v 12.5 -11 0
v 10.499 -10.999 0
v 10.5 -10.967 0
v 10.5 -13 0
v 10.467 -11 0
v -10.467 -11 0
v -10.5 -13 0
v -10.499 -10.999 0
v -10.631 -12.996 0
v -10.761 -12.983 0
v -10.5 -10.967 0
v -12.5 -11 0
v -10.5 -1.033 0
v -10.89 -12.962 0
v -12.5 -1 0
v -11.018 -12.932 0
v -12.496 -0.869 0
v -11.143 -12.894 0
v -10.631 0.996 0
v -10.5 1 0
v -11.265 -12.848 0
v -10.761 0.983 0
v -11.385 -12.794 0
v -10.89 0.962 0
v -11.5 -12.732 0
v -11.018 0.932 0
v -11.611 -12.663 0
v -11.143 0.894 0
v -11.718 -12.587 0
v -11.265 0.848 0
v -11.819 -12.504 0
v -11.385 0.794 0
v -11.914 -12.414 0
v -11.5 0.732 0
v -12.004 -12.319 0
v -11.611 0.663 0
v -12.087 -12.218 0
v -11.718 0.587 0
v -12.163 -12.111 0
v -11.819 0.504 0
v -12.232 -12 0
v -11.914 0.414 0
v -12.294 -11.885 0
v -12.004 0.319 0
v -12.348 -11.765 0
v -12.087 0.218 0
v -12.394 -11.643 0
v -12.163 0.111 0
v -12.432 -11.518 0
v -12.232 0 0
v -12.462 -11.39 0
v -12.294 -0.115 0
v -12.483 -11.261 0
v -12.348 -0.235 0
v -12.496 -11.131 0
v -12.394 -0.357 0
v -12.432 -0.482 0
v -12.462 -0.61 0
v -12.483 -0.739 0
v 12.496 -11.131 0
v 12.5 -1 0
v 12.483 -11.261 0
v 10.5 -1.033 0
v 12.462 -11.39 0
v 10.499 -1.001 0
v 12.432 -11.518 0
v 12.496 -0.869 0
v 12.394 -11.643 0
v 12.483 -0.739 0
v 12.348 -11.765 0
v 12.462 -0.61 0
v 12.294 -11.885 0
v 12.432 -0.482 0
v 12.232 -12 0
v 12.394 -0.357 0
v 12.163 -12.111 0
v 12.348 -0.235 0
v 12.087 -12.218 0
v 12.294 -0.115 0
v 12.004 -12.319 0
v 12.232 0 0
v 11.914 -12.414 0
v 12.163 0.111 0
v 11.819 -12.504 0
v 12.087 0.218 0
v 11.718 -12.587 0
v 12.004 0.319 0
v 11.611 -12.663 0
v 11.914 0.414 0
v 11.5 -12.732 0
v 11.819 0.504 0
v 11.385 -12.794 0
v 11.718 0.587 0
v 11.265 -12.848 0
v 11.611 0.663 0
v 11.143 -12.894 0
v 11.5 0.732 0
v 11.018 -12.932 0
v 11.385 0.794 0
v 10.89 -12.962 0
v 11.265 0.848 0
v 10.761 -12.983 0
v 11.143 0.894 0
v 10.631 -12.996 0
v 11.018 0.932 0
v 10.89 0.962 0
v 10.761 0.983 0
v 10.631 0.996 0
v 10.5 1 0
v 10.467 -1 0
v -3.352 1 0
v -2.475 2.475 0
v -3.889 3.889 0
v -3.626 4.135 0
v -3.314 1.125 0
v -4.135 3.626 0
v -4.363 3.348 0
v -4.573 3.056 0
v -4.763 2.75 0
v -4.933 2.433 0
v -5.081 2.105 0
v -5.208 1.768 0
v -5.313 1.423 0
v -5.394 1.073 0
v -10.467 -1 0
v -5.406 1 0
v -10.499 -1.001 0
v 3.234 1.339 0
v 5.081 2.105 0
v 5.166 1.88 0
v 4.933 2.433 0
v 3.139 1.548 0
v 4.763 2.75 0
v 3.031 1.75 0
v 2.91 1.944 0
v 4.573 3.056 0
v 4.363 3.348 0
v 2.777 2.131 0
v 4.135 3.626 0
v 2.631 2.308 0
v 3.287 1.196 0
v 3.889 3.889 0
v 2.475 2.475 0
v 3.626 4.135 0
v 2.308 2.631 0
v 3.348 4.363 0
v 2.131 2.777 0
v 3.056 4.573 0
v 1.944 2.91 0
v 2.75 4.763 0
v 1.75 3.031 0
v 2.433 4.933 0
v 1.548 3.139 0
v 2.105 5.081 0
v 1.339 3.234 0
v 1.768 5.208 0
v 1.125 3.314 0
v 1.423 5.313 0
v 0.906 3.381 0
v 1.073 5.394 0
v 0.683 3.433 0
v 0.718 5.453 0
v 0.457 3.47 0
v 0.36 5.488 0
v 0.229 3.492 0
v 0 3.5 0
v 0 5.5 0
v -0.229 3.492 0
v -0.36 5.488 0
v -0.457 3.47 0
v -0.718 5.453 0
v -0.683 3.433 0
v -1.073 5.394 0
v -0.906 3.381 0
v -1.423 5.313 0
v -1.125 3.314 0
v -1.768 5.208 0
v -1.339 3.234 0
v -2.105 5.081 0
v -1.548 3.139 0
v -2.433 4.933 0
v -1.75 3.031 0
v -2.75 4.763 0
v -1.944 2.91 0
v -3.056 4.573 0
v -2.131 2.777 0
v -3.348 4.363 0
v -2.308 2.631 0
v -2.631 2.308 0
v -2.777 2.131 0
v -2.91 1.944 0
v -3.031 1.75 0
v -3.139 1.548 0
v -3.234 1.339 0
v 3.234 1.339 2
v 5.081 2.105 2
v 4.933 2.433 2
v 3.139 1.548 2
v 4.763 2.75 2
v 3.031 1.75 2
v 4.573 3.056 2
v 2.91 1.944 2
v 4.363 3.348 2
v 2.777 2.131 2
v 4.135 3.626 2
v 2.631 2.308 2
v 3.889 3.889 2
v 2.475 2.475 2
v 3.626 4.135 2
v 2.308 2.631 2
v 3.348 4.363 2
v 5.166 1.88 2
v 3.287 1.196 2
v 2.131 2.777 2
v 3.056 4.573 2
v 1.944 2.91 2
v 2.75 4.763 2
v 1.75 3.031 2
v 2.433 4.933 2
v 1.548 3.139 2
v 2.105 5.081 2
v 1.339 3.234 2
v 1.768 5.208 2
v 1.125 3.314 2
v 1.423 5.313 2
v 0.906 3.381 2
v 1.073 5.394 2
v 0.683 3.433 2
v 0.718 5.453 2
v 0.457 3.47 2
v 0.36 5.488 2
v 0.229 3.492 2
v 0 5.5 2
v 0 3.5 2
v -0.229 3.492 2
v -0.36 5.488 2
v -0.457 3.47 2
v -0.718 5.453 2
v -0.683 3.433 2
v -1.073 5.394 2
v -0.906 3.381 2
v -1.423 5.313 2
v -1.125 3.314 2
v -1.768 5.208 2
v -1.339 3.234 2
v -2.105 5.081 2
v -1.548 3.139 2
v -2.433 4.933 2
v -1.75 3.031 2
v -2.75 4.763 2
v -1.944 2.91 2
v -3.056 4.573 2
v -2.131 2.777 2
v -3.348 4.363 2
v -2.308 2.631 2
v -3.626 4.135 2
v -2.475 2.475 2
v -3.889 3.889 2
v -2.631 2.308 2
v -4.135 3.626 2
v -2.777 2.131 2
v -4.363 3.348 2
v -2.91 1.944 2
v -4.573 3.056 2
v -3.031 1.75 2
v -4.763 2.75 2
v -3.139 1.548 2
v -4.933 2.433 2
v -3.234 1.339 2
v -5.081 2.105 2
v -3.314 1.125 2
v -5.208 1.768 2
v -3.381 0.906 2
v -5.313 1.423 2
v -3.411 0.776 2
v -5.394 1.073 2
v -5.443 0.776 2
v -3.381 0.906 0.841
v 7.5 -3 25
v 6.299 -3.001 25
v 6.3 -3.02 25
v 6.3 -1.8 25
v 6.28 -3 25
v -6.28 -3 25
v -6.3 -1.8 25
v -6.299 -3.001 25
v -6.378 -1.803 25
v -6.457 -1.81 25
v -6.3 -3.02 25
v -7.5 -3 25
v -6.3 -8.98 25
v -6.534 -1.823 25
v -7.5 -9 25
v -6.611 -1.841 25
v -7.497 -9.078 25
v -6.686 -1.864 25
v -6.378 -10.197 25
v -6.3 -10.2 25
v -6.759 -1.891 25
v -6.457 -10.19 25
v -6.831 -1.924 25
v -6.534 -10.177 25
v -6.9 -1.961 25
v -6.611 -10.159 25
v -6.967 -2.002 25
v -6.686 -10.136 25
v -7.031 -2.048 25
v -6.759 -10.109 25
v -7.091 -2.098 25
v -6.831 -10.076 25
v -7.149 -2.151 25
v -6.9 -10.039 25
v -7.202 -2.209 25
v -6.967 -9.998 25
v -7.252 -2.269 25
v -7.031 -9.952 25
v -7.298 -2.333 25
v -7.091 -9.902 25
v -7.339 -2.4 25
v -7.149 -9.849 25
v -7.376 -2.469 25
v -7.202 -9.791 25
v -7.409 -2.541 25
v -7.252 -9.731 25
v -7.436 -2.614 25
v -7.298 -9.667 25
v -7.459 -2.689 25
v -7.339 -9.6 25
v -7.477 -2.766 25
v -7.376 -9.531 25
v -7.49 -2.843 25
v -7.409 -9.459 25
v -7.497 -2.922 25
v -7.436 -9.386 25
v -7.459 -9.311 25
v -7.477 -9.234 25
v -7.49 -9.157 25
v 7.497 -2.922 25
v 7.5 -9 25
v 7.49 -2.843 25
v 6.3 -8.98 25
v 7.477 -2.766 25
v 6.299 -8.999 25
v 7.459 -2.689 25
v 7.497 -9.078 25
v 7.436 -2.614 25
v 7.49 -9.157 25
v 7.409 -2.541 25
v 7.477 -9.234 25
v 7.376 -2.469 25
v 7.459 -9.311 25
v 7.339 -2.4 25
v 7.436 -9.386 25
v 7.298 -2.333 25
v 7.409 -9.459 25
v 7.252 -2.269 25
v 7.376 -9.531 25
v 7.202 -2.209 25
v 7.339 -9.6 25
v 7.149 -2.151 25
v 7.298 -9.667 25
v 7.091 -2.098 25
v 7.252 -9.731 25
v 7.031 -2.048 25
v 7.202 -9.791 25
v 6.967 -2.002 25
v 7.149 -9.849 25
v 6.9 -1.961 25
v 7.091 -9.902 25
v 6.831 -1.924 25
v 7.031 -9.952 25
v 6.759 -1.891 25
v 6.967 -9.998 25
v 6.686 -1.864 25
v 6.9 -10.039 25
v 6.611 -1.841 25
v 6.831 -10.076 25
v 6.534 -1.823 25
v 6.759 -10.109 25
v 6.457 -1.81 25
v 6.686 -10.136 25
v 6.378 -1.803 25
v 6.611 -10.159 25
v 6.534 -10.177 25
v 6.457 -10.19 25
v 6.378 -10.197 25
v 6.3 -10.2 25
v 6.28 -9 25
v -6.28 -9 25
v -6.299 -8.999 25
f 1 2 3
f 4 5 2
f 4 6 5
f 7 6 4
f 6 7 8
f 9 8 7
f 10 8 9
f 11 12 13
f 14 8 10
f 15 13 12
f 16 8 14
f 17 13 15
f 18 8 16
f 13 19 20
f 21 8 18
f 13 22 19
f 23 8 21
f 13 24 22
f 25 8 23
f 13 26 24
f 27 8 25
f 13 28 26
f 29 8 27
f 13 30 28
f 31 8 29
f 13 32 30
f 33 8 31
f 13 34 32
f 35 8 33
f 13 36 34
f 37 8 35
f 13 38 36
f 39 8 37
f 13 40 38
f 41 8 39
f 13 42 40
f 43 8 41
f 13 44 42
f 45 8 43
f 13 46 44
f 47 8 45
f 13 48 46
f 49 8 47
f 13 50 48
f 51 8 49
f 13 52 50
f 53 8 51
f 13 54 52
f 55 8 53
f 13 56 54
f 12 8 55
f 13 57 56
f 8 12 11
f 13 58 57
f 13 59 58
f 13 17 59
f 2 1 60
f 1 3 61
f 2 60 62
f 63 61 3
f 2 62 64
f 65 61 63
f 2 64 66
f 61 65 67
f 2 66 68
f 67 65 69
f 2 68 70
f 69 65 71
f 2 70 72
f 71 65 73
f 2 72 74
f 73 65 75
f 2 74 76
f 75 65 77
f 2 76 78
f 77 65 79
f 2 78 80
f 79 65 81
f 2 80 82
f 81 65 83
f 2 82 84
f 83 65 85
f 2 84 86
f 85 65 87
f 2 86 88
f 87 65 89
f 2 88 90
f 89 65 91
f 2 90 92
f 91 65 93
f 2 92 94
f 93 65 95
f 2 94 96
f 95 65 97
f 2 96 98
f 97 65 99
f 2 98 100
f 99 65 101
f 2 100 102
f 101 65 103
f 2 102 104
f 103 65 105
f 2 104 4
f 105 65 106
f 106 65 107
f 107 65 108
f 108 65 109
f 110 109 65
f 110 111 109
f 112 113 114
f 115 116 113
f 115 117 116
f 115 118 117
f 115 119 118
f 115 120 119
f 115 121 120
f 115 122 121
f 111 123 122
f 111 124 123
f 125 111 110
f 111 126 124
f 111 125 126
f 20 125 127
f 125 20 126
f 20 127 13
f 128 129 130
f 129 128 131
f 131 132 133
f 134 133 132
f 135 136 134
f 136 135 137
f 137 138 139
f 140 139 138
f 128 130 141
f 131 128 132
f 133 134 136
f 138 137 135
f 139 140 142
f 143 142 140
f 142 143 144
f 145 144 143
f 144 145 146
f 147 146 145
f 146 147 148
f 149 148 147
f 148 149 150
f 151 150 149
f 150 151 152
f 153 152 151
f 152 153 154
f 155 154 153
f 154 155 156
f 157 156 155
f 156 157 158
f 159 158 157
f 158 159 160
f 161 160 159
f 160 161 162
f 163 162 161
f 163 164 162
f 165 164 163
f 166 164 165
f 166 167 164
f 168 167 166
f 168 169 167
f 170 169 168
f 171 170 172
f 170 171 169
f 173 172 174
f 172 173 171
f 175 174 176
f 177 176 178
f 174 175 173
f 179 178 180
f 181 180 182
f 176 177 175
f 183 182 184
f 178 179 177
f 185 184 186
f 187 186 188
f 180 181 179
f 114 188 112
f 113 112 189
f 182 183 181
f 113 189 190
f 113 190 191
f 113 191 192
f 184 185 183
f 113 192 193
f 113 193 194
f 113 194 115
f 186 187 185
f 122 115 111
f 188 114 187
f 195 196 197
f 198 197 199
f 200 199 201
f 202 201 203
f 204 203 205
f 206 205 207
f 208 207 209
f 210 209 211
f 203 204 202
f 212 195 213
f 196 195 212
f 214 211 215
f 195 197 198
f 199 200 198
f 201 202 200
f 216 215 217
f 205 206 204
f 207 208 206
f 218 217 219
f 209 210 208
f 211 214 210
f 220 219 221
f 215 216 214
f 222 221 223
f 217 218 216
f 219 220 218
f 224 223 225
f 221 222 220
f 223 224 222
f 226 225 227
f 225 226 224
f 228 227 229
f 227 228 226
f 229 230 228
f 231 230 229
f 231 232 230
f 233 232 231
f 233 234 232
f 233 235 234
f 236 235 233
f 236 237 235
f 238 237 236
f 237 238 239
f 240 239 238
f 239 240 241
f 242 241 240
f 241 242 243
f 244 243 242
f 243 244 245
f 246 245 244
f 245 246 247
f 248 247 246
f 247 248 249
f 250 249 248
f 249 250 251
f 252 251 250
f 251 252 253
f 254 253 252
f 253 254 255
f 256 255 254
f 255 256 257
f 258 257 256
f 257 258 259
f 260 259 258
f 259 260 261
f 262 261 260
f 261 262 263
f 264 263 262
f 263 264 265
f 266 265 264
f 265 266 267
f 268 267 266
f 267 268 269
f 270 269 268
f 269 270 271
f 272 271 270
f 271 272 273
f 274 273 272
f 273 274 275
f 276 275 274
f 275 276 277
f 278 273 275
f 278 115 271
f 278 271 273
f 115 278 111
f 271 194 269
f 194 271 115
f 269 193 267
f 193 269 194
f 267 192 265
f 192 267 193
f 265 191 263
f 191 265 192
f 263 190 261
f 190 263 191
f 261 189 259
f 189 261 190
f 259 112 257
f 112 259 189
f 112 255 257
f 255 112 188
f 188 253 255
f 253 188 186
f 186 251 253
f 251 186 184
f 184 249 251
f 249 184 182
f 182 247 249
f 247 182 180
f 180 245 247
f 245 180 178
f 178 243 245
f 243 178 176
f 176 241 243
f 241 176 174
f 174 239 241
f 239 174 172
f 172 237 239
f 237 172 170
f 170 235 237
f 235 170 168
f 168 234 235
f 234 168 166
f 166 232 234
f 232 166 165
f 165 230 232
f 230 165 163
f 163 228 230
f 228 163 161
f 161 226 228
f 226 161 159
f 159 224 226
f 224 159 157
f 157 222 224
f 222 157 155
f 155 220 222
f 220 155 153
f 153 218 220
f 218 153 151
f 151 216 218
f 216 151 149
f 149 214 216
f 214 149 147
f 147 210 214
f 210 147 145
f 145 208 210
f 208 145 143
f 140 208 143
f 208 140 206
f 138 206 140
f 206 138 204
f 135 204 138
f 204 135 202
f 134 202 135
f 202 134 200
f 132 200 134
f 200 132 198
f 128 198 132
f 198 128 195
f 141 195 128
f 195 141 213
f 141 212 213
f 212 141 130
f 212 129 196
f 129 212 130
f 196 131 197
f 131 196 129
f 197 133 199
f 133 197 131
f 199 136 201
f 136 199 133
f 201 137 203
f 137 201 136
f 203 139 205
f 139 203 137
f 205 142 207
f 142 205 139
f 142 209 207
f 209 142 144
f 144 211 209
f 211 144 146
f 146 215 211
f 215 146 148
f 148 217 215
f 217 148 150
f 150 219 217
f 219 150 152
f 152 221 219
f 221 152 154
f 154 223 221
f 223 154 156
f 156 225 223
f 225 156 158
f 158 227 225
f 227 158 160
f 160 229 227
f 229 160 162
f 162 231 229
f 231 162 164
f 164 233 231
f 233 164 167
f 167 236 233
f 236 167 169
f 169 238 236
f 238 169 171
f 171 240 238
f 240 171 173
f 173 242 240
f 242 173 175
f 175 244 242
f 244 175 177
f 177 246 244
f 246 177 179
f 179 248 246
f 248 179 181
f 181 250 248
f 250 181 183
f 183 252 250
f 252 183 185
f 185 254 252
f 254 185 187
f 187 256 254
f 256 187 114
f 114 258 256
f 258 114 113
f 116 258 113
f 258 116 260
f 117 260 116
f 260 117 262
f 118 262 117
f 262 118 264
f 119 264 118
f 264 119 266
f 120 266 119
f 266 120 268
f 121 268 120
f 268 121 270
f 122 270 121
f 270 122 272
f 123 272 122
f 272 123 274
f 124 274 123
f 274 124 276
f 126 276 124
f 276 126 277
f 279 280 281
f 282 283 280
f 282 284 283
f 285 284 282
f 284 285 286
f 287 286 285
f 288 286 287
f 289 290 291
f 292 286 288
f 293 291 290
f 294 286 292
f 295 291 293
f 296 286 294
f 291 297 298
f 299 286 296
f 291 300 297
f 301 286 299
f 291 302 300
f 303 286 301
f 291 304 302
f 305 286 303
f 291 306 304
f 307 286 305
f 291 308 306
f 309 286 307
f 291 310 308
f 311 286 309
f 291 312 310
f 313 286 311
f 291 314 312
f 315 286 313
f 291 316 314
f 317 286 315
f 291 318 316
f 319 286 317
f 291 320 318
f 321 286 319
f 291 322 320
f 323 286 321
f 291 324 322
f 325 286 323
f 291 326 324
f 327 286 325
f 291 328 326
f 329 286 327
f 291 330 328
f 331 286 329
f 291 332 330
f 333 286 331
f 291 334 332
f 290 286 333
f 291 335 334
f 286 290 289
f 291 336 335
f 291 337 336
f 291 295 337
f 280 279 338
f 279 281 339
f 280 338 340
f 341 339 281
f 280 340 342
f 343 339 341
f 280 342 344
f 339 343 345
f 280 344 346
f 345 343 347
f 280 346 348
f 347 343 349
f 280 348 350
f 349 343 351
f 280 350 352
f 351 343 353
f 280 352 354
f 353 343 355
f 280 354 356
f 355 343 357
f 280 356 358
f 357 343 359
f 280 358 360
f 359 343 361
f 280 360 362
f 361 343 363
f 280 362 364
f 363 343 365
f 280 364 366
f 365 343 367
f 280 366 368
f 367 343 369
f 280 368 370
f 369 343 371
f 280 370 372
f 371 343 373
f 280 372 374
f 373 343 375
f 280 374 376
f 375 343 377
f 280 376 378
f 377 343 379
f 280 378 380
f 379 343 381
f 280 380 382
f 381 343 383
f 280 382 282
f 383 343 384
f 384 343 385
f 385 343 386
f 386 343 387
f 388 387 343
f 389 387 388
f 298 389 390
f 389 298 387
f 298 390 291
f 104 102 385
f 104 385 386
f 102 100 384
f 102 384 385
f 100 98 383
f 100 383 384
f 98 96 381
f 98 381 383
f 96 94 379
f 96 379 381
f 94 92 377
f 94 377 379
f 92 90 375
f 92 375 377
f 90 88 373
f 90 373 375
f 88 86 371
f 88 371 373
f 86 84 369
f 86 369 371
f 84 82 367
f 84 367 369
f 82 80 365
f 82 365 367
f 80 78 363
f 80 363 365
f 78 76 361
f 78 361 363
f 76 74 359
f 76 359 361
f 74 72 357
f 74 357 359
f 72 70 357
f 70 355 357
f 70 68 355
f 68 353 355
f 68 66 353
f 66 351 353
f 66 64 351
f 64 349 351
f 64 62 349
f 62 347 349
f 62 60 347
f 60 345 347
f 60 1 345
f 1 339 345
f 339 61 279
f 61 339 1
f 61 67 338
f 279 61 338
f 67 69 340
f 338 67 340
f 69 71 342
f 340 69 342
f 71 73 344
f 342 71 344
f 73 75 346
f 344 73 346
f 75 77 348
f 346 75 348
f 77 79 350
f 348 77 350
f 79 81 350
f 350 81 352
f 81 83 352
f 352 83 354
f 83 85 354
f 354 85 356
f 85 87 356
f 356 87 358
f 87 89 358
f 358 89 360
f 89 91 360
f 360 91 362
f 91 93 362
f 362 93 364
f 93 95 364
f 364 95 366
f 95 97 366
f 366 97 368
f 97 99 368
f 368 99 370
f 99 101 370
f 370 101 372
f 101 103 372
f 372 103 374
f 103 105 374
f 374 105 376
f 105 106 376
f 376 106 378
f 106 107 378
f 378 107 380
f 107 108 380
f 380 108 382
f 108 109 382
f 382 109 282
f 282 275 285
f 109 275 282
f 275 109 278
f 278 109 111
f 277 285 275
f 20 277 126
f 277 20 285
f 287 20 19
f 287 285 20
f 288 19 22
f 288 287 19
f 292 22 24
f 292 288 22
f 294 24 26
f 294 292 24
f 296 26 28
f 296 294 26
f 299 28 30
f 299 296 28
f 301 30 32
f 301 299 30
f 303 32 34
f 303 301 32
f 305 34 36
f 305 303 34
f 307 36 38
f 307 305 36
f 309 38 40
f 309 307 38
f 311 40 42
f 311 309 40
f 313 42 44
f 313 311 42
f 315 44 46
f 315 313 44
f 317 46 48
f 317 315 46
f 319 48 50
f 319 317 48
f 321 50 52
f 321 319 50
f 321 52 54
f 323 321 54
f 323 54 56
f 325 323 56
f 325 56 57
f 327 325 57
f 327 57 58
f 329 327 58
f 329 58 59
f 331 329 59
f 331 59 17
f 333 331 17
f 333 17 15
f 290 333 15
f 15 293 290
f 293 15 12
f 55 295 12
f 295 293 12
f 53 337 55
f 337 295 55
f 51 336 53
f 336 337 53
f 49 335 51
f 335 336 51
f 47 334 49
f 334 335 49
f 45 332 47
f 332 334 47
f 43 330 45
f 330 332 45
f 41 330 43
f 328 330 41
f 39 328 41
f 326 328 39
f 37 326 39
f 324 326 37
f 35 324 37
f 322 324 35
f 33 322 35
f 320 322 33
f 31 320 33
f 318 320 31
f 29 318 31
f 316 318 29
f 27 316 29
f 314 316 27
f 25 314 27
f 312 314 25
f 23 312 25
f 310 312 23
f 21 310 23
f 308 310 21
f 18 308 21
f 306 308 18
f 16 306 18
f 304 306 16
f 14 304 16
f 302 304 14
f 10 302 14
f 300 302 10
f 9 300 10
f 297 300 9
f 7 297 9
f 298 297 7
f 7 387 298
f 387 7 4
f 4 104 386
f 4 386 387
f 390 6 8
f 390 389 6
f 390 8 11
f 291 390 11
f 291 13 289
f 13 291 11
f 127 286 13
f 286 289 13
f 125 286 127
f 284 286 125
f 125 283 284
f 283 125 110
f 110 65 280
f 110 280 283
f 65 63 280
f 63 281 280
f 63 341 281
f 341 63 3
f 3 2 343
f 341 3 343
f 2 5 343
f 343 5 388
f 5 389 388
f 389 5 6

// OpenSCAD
ring_radius = 3.5;
ring_start_angle = 20;
ring_end_angle = 180;
thickness = 2;

funnel_length = 25;
funnel_width = 14;
funnel_height = 25;
linear_extrude_scale = 0.6;

union() {
    linear_extrude(thickness) 
        arc(radius = ring_radius, 
            angle = [ring_start_angle, ring_end_angle], 
            width = thickness, 
            width_mode = "LINE_OUTWARD",
            $fn = 96);

    translate([0, -funnel_width / 2+ thickness / 2, 0]) 
        linear_extrude(funnel_height, scale = linear_extrude_scale) 
            hollow_out(shell_thickness = thickness)
                rounded_square(
                    size = [funnel_length, funnel_width],
                    corner_r = 2, 
                    center = true,
                    $fn = 96
                );
}
    
/**
 * The dotSCAD library
 * @copyright Justin Lin, 2017
 * @license https://opensource.org/licenses/lgpl-3.0.html
 *
 * @see https://github.com/JustinSDK/dotSCAD
*/

/**
* arc.scad
*
* Creates an arc. You can pass a 2 element vector to define the central angle. 
* Its $fa, $fs and $fn parameters are consistent with the circle module.
* It depends on the circular_sector module so you have to include circular_sector.scad.
* 
* @copyright Justin Lin, 2017
* @license https://opensource.org/licenses/lgpl-3.0.html
*
* @see https://openhome.cc/eGossip/OpenSCAD/lib-arc.html
*
**/ 


module arc(radius, angle, width, width_mode = "LINE_CROSS") {
    polygon(__shape_arc(radius, angle, width, width_mode));
}

function __frags(radius) = $fn > 0 ? 
            ($fn >= 3 ? $fn : 3) : 
            max(min(360 / $fa, radius * 6.28318 / $fs), 5);

function __trapezium(length, h, round_r) =
    let(
        r_half_trapezium = __half_trapezium(length / 2, h, round_r),
        to = len(r_half_trapezium) - 1,
        l_half_trapezium = [
            for(i = [0:to]) 
                let(pt = r_half_trapezium[to - i])
                [-pt[0], pt[1]]
        ]
    )    
    concat(
        r_half_trapezium,
        l_half_trapezium
    );

/**
* rounded_square.scad
*
* Creates a rounded square or rectangle in the first quadrant. 
* When center is true the square is centered on the origin.
* 
* @copyright Justin Lin, 2017
* @license https://opensource.org/licenses/lgpl-3.0.html
*
* @see https://openhome.cc/eGossip/OpenSCAD/lib-rounded_square.html
*
**/


module rounded_square(size, corner_r, center = false) {
    is_vt = __is_vector(size);
    x = is_vt ? size[0] : size;
    y = is_vt ? size[1] : size;       
    
    position = center ? [0, 0] : [x / 2, y / 2];
    points = __trapezium(
        length = x, 
        h = y, 
        round_r = corner_r
    );

    translate(position) 
        polygon(points);

    // hook for testing
    test_rounded_square(position, points);
}

// override it to test
module test_rounded_square(position, points) {
}

function __edge_r_begin(orig_r, a, a_step, m) =
    let(leng = orig_r * cos(a_step / 2))
    leng / cos((m - 0.5) * a_step - a);

function __edge_r_end(orig_r, a, a_step, n) =      
    let(leng = orig_r * cos(a_step / 2))    
    leng / cos((n + 0.5) * a_step - a);

function __shape_arc(radius, angle, width, width_mode = "LINE_CROSS") =
    let(
        w_offset = width_mode == "LINE_CROSS" ? [width / 2, -width / 2] : (
            width_mode == "LINE_INWARD" ? [0, -width] : [width, 0]
        ),
        frags = __frags(radius),
        a_step = 360 / frags,
        half_a_step = a_step / 2,
        angles = __is_vector(angle) ? angle : [0, angle],
        m = floor(angles[0] / a_step) + 1,
        n = floor(angles[1] / a_step),
        r_outer = radius + w_offset[0],
        r_inner = radius + w_offset[1],
        points = concat(
            // outer arc path
            [__ra_to_xy(__edge_r_begin(r_outer, angles[0], a_step, m), angles[0])],
            m > n ? [] : [
                for(i = [m:n]) 
                    __ra_to_xy(r_outer, a_step * i)
            ],
            angles[1] == a_step * n ? [] : [__ra_to_xy(__edge_r_end(r_outer, angles[1], a_step, n), angles[1])],
            // inner arc path
            angles[1] == a_step * n ? [] : [__ra_to_xy(__edge_r_end(r_inner, angles[1], a_step, n), angles[1])],
            m > n ? [] : [
                for(i = [m:n]) 
                    let(idx = (n + (m - i)))
                    __ra_to_xy(r_inner, a_step * idx)

            ],
            [__ra_to_xy(__edge_r_begin(r_inner, angles[0], a_step, m), angles[0])]        
        )
    ) points;

function __pie_for_rounding(r, begin_a, end_a, frags) =
    let(
        sector_angle = end_a - begin_a,
        step_a = sector_angle / frags,
        is_integer = frags % 1 == 0
    )
    r < 0.00005 ? [[0, 0]] : concat([
        for(ang = [begin_a:step_a:end_a])
            [
                r * cos(ang), 
                r * sin(ang)
            ]
    ], 
    is_integer ? [] : [[
            r * cos(end_a), 
            r * sin(end_a)
        ]]
    );

function __ra_to_xy(r, a) = [r * cos(a), r * sin(a)];

function __tr__corner_t_leng_lt_zero(frags, t_sector_angle, l1, l2, h, round_r) = 
    let(t_height = tan(t_sector_angle) * l1 - round_r / sin(90 - t_sector_angle) - h / 2)
    [ 
        for(pt = __pie_for_rounding(round_r, 90 - t_sector_angle, 90, frags * t_sector_angle / 180))
            [pt[0], pt[1] + t_height]
    ];

function __tr_corner_t_leng_gt_or_eq_zero(frags, t_sector_angle, t_leng, h, round_r) = 
    let(offset_y = h / 2 - round_r)
    [
        for(pt = __pie_for_rounding(round_r, 90 - t_sector_angle, 90, frags * t_sector_angle / 360))
            [pt[0] + t_leng, pt[1] + offset_y]
    ];    

function __tr_corner(frags, b_ang, l1, l2, h, round_r) = 
    let(t_leng = l2 - round_r * tan(b_ang / 2))
    t_leng >= 0 ? 
        __tr_corner_t_leng_gt_or_eq_zero(frags, b_ang, t_leng, h, round_r) : 
        __tr__corner_t_leng_lt_zero(frags, b_ang, l1, l2, h, round_r);

function __tr__corner_b_leng_lt_zero(frags, b_sector_angle, l1, l2, h, round_r) = 
    let(
        reversed = __tr__corner_t_leng_lt_zero(frags, b_sector_angle, l2, l1, h, round_r),
        leng = len(reversed)
    )
    [
        for(i = [0:leng - 1])
            let(pt = reversed[leng - 1 - i])
            [pt[0], -pt[1]]
    ];

function __br_corner_b_leng_gt_or_eq_zero(frags, b_sector_angle, l1, l2, b_leng, h, round_r) = 
    let(half_h = h / 2) 
    [
        for(pt = __pie_for_rounding(round_r, -90, -90 + b_sector_angle, frags * b_sector_angle / 360))
            [pt[0] + b_leng, pt[1] + round_r - half_h]
    ];

function __br_corner(frags, b_ang, l1, l2, h, round_r) = 
    let(b_leng = l1 - round_r / tan(b_ang / 2)) 
    b_leng >= 0 ? 
    __br_corner_b_leng_gt_or_eq_zero(frags, 180 - b_ang, l1, l2, b_leng, h, round_r) :
    __tr__corner_b_leng_lt_zero(frags, 180 - b_ang, l1, l2, h, round_r);

function __half_trapezium(length, h, round_r) =
    let(
        is_vt = __is_vector(length),
        l1 = is_vt ? length[0] : length,
        l2 = is_vt ? length[1] : length,
        frags = __frags(round_r),
        b_ang = atan2(h, l1 - l2),
        br_corner = __br_corner(frags, b_ang, l1, l2, h, round_r),
        tr_corner = __tr_corner(frags, b_ang, l1, l2, h, round_r)
    )    
    concat(
        br_corner,
        tr_corner
    );

/**
* hollow_out.scad
*
* Hollows out a 2D object. 
* 
* @copyright Justin Lin, 2017
* @license https://opensource.org/licenses/lgpl-3.0.html
*
* @see https://openhome.cc/eGossip/OpenSCAD/lib-hollow_out.html
*
**/

module hollow_out(shell_thickness) {
    difference() {
        children();
        offset(delta = -shell_thickness) children();
    }
}

function __is_vector(value) = !(value >= "") && len(value) != undef;
